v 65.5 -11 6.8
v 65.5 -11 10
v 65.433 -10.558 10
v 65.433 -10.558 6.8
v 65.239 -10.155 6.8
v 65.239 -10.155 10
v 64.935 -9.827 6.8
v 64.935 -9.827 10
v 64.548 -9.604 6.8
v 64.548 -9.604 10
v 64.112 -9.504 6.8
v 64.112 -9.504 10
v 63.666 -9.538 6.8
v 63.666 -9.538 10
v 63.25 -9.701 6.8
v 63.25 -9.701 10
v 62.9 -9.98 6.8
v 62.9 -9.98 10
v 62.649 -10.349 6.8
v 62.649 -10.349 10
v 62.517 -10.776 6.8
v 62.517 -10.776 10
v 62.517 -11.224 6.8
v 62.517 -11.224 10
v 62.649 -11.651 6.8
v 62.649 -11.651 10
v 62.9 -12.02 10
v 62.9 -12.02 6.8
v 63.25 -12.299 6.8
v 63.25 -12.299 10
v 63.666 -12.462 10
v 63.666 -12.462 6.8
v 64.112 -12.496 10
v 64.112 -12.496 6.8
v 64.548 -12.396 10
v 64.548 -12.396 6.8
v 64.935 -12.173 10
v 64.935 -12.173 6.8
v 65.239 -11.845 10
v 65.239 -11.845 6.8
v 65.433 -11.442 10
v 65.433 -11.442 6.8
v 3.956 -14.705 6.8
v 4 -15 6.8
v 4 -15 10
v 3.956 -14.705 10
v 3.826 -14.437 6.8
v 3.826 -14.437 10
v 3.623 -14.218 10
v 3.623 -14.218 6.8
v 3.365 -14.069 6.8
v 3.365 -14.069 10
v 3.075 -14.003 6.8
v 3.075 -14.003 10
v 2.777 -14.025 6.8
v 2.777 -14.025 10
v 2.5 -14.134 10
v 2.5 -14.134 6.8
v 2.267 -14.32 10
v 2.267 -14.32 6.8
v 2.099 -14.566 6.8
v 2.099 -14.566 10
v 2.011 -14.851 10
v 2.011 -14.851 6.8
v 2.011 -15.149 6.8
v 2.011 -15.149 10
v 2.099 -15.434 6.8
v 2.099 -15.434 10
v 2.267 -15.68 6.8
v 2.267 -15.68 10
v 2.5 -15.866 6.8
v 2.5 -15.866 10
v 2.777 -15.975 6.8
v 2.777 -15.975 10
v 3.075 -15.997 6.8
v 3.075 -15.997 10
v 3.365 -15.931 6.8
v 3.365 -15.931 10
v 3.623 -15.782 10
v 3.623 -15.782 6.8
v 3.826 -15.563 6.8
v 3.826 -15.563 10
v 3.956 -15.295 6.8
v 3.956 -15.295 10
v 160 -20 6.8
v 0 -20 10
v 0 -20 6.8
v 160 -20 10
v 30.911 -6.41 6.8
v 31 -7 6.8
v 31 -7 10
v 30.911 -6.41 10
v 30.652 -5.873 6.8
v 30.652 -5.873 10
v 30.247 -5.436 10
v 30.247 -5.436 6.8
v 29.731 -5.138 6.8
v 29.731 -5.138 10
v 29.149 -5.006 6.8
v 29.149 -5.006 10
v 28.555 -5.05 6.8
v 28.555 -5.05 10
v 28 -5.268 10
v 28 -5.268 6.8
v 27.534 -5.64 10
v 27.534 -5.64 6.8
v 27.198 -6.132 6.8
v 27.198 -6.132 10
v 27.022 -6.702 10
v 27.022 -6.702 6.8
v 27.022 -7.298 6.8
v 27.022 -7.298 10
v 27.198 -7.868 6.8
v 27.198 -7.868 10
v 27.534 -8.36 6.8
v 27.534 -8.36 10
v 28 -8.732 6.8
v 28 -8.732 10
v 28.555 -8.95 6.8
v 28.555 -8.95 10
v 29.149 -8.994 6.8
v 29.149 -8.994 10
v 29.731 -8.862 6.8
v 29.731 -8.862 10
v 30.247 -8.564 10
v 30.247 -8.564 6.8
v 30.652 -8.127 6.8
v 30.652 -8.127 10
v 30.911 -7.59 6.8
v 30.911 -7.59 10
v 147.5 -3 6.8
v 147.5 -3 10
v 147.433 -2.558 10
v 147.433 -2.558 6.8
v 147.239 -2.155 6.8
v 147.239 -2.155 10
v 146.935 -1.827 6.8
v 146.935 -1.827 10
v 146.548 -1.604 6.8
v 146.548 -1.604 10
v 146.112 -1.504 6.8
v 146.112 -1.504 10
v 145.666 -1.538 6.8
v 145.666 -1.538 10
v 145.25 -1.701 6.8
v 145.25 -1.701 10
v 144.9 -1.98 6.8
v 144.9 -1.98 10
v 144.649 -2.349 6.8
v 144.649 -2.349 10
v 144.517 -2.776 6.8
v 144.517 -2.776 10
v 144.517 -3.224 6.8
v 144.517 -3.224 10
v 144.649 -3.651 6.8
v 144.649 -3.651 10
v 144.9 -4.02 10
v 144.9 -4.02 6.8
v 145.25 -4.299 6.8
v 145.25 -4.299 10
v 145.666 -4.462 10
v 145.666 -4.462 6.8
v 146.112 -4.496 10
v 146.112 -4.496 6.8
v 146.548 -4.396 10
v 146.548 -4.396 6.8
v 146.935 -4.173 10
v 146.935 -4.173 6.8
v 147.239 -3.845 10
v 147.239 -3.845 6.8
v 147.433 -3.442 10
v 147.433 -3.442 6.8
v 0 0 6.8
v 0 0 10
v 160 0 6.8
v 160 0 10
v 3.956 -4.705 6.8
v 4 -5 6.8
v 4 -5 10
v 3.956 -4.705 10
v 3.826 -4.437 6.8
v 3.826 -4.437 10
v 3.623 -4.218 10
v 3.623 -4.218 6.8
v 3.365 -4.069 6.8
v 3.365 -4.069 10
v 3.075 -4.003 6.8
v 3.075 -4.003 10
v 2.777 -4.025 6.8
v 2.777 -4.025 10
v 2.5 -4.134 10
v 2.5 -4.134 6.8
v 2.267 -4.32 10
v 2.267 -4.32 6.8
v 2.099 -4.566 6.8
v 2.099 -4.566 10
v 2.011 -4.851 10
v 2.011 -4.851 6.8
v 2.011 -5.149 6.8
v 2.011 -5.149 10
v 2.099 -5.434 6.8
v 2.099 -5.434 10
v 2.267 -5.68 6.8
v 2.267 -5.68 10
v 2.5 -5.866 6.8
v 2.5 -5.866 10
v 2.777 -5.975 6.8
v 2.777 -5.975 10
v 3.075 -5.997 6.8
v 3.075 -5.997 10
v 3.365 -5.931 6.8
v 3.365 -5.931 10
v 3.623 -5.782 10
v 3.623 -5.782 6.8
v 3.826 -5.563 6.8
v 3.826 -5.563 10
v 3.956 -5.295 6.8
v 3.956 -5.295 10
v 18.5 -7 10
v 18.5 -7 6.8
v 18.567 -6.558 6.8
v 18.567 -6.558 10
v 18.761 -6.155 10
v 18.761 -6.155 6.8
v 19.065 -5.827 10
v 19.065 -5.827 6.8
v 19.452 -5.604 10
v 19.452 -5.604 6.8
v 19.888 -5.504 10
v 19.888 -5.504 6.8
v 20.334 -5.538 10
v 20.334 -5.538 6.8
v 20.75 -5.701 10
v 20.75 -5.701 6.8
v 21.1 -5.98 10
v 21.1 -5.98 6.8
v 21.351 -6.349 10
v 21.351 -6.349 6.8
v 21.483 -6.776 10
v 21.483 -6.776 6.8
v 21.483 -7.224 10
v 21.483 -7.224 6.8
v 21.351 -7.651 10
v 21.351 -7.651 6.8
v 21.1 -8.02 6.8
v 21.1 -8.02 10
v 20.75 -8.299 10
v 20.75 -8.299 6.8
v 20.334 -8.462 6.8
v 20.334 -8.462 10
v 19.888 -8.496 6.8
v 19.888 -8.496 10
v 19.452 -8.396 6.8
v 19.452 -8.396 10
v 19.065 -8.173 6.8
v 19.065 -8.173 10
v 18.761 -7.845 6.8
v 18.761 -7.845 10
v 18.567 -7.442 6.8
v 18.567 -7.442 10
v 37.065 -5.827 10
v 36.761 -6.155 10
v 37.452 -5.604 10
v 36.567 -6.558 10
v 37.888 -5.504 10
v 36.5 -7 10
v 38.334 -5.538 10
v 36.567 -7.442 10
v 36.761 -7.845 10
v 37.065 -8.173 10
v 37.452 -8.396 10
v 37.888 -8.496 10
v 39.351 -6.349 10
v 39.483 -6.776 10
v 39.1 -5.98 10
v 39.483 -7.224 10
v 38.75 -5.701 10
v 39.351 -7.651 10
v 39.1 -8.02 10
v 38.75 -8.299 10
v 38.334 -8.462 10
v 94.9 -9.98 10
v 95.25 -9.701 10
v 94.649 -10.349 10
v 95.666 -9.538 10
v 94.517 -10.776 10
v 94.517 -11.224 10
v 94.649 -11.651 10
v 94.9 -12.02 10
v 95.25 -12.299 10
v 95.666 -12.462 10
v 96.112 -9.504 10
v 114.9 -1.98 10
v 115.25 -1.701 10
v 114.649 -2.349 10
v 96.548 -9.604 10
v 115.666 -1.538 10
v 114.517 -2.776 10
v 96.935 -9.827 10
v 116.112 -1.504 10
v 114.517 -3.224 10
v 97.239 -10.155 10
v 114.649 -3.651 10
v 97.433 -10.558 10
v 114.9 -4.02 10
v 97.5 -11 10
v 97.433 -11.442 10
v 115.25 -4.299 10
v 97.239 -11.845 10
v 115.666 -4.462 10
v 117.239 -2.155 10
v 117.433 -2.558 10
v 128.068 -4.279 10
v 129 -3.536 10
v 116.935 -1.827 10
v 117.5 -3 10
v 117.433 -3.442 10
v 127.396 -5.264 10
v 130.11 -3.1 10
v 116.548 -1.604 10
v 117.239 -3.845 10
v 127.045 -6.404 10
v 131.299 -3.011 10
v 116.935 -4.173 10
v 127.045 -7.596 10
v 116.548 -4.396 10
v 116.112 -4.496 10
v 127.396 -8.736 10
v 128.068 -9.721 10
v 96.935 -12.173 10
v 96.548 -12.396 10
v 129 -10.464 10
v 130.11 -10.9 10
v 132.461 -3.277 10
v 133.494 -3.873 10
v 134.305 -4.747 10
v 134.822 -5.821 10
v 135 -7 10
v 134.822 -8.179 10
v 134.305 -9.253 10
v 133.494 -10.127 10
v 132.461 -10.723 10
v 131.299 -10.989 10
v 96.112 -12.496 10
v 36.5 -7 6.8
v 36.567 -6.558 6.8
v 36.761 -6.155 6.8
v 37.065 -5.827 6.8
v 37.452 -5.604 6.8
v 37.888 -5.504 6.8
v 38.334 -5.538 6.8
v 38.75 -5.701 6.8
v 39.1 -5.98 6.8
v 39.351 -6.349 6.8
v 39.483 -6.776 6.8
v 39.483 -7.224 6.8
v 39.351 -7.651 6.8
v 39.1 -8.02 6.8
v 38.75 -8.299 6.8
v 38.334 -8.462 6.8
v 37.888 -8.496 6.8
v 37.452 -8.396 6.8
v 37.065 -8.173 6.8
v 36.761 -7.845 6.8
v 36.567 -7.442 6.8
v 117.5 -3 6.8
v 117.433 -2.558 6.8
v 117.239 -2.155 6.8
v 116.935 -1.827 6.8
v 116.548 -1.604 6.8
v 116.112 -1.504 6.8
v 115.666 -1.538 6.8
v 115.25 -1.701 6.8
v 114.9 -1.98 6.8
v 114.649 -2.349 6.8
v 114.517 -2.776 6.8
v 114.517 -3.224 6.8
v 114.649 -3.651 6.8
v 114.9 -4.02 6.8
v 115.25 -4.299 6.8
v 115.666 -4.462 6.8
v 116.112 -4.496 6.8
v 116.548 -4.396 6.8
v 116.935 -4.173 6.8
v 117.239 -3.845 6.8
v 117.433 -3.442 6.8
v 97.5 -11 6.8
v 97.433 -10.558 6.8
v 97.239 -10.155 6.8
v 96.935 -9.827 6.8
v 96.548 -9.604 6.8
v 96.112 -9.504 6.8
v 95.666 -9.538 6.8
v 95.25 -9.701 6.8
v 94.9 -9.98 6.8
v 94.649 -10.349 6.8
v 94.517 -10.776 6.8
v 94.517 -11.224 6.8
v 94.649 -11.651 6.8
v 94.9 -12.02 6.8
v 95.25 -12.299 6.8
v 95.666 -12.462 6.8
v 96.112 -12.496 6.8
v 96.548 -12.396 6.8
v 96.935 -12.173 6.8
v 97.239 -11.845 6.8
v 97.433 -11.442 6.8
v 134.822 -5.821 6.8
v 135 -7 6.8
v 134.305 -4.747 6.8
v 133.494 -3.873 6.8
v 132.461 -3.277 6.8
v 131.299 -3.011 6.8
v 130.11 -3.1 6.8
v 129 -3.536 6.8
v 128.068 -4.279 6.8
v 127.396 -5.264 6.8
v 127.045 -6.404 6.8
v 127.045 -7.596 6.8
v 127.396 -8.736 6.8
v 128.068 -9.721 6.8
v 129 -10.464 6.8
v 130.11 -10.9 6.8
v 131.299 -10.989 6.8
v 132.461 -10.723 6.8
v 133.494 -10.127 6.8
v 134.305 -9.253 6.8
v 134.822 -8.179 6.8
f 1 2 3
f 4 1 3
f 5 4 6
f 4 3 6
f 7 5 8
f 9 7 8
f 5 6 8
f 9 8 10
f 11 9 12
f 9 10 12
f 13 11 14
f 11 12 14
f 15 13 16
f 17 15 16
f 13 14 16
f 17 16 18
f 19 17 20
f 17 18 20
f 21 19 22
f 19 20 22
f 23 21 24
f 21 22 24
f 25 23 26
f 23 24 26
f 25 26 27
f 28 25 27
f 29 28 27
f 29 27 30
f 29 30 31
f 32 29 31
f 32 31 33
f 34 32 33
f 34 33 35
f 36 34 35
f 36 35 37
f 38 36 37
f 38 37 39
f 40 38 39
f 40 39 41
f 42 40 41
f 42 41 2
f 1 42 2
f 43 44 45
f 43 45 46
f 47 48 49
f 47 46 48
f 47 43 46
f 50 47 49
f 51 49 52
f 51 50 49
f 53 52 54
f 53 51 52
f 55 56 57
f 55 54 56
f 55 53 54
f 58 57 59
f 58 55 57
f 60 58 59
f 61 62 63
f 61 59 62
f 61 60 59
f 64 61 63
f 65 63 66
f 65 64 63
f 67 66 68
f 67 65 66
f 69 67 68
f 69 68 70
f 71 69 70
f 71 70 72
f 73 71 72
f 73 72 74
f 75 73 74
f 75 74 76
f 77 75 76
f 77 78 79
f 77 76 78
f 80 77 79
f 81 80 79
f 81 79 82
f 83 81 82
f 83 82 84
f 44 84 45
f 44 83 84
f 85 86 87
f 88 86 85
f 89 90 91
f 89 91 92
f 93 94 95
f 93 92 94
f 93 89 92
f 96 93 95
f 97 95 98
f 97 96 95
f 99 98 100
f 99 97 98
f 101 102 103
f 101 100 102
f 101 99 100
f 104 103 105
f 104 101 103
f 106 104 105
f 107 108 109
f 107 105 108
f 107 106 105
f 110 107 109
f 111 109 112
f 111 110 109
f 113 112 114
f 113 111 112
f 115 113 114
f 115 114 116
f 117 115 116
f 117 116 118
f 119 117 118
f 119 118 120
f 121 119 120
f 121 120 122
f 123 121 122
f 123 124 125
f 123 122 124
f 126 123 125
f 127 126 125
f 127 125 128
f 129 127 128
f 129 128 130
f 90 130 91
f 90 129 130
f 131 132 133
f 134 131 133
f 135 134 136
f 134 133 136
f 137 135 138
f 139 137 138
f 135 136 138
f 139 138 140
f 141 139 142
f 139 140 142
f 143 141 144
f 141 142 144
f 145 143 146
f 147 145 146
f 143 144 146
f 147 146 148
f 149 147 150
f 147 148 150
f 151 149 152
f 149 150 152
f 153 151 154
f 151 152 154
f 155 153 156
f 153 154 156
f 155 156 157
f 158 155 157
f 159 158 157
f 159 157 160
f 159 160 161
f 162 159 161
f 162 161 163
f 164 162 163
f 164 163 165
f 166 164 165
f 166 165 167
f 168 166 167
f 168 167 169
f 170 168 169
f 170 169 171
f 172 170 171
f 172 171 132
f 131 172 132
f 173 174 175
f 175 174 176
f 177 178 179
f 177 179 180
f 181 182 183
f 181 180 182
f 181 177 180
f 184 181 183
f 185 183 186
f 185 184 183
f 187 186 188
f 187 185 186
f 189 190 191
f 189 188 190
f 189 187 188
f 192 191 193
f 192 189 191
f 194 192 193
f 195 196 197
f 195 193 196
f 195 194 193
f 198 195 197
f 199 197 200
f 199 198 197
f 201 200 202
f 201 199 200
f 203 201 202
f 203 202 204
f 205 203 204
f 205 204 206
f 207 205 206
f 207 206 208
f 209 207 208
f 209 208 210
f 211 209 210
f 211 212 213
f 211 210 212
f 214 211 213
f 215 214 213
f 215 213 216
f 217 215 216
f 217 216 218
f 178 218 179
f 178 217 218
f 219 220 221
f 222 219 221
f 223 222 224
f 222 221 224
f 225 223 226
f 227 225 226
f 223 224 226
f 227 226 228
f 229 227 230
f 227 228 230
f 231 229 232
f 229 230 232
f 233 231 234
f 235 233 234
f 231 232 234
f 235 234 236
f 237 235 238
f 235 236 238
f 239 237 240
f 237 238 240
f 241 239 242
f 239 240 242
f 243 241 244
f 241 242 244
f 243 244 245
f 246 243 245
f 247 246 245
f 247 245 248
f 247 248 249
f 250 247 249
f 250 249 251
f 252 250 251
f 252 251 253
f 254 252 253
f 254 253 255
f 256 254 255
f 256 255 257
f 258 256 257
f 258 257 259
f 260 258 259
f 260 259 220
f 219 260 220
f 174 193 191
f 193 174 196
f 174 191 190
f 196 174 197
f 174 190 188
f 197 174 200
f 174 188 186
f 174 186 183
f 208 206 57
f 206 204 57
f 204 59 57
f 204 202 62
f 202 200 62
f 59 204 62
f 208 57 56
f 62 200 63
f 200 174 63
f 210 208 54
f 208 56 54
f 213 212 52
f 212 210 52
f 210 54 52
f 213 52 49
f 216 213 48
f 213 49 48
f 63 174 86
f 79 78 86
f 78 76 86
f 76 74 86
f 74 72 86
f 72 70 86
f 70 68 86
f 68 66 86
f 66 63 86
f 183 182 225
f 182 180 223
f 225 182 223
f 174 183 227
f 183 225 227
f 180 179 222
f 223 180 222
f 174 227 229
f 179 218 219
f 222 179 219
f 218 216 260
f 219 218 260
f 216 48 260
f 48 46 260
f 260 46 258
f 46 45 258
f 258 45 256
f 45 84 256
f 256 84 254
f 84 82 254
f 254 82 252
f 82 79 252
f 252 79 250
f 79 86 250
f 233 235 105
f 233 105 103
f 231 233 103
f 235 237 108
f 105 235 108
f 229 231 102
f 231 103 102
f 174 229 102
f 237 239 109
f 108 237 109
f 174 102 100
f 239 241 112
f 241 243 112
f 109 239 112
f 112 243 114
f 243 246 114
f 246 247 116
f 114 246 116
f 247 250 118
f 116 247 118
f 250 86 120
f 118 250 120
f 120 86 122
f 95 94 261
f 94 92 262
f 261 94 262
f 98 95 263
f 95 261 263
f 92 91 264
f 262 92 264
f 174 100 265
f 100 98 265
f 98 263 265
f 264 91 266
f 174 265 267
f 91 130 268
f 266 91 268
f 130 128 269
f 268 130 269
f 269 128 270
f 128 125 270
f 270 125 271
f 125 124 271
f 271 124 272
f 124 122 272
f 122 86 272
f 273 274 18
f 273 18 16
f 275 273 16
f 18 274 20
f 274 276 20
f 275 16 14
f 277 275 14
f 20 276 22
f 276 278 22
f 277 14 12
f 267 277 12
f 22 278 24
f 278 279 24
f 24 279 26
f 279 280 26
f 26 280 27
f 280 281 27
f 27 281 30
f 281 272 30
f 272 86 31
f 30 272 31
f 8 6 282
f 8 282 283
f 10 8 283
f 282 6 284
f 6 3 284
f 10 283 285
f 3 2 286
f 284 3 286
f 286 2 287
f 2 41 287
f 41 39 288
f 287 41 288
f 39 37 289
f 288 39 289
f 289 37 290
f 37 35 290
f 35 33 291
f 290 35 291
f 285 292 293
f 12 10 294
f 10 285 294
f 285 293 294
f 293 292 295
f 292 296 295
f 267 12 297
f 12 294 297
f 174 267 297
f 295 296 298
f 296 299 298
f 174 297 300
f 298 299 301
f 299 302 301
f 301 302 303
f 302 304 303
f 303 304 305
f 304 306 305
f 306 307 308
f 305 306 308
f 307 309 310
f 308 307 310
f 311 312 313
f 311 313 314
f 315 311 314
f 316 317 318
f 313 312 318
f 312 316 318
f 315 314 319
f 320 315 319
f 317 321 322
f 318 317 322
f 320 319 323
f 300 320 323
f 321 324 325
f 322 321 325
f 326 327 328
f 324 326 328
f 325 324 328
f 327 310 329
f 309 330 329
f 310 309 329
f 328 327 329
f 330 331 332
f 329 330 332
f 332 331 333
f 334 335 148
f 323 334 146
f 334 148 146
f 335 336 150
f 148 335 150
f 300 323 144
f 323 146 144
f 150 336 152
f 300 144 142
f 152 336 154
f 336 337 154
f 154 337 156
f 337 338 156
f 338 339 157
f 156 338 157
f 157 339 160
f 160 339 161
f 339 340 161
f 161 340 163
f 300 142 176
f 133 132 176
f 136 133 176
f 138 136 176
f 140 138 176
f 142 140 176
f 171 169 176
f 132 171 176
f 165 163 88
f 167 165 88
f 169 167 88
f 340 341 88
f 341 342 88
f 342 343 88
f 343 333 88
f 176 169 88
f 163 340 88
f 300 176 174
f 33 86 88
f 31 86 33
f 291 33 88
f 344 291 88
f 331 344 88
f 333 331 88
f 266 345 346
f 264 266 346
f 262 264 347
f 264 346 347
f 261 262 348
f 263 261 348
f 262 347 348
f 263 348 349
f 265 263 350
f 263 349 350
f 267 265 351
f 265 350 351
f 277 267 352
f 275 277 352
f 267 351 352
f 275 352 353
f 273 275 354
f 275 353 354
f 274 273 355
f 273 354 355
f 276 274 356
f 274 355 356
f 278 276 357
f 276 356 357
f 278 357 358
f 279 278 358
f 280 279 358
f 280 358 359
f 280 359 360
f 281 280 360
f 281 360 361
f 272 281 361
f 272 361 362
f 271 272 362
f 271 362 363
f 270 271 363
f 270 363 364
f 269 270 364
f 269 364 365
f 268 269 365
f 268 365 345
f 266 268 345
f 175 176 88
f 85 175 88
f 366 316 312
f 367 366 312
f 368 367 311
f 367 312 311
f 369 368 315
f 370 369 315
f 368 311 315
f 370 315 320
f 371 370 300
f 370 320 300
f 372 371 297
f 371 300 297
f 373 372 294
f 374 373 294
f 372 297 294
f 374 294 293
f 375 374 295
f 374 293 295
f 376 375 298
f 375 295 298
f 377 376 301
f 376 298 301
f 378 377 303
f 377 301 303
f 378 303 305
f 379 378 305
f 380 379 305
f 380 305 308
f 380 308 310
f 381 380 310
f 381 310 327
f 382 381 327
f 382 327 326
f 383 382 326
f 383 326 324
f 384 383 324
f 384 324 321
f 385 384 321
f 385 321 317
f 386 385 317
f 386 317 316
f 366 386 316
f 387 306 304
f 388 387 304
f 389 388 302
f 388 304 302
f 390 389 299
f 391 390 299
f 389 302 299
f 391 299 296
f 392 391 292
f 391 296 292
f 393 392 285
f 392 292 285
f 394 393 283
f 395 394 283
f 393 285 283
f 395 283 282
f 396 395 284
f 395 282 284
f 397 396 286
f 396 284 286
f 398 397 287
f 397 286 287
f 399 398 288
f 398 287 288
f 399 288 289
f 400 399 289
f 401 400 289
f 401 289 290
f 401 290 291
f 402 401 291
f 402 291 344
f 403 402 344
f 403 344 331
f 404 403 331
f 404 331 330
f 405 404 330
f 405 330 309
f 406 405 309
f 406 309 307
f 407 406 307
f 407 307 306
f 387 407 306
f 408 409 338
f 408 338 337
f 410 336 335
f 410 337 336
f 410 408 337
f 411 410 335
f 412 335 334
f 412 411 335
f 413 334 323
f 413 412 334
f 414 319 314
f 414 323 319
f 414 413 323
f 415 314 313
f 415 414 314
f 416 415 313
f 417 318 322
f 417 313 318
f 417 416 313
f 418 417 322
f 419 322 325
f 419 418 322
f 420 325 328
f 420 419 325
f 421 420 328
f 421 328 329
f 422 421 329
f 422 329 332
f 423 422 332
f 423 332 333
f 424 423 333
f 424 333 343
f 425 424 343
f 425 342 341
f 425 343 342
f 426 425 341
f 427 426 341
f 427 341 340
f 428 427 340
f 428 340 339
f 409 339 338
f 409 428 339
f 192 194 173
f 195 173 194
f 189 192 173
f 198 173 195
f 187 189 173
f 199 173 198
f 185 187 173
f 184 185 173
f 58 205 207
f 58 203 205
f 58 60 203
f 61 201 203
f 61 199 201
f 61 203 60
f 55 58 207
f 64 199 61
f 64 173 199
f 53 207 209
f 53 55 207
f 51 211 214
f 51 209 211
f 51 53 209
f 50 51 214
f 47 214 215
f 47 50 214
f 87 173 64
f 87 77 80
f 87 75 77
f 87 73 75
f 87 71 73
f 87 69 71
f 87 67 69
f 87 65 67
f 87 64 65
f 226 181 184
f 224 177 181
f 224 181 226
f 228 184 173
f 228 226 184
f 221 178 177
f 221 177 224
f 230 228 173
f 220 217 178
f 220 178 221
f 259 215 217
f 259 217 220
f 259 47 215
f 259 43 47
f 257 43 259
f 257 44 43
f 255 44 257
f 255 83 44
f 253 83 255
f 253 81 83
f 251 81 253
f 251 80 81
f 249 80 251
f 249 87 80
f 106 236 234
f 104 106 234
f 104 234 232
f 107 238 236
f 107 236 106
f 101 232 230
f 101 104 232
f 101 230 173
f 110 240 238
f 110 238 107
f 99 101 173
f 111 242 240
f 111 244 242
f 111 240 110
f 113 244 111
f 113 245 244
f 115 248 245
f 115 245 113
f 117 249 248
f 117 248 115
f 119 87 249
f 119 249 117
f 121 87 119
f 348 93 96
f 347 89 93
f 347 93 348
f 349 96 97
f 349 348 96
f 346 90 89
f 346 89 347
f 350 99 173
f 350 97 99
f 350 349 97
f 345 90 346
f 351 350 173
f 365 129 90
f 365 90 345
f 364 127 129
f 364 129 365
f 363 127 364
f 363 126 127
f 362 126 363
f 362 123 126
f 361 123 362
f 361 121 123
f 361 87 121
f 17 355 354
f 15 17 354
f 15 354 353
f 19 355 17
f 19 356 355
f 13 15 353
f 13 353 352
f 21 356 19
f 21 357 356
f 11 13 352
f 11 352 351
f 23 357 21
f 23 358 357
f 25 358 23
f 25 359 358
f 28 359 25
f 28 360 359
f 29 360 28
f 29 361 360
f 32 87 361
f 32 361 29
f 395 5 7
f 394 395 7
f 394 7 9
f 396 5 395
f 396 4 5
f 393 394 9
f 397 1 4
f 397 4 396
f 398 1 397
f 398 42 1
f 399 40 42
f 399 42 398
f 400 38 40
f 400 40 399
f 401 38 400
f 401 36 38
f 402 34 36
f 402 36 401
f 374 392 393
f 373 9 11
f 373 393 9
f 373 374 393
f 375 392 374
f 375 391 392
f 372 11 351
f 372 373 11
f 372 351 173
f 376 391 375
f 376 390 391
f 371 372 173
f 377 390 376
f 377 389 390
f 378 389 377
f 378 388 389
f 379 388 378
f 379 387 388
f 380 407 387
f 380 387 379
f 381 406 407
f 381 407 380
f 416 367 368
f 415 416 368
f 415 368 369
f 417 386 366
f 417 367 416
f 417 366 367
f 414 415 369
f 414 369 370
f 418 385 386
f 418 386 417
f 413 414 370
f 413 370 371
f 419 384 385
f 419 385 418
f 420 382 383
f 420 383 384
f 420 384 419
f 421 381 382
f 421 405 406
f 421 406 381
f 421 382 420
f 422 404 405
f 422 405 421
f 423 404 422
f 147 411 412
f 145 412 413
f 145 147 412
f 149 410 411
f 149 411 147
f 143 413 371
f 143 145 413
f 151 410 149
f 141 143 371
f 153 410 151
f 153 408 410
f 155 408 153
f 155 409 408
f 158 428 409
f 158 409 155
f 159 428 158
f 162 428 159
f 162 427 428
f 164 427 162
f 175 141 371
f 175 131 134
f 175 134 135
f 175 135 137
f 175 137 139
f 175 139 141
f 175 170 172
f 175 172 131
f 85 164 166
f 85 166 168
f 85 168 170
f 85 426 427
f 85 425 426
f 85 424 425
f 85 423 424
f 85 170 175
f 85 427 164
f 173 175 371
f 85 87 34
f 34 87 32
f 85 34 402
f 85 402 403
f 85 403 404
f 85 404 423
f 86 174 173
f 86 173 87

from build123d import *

# Parameters (mm, degrees)
SKETCH2_W               = 160
SKETCH2_H               = 20
BOSS_EXTRUDE1_DEPTH     = 3.2
CUT_EXTRUDE1_DEPTH      = 162.276904732
CUT_EXTRUDE1_DEPTH_BACK = 162.276904732
SKETCH5_R               = 4
SKETCH5_R_2             = 2
SKETCH6_R               = 1.5
CUT_EXTRUDE2_DEPTH      = 10
CUT_EXTRUDE3_DEPTH      = 162.276904732
CUT_EXTRUDE3_DEPTH_BACK = 162.276904732
SKETCH7_R               = 1
SKETCH8_R               = 1.5
CUT_EXTRUDE4_DEPTH      = 10
SKETCH9_R               = 1.5
CUT_EXTRUDE5_DEPTH      = 10


with BuildPart() as part:
    # Sketch2 → Boss-Extrude1 (new body)
    with BuildSketch(Plane(origin=(0, -10, 10), x_dir=(1, 0, 0), z_dir=(0, 0, -1))):
        with Locations((80, 0)):
            Rectangle(SKETCH2_W, SKETCH2_H)
    extrude(amount=BOSS_EXTRUDE1_DEPTH)

    # Sketch5 → Cut-Extrude1 (cut, two sides: drawn at the far end of the back side and taken through both)
    with BuildSketch(Plane.XY.offset(10).offset(-CUT_EXTRUDE1_DEPTH_BACK)):
        with Locations((131, -7)):
            Circle(SKETCH5_R)
        with Locations((29, -7)):
            Circle(SKETCH5_R_2)
    extrude(amount=CUT_EXTRUDE1_DEPTH + CUT_EXTRUDE1_DEPTH_BACK, mode=Mode.SUBTRACT)

    # Sketch6 → Cut-Extrude2 (cut)
    with BuildSketch(Plane.XY.offset(10)):
        with Locations((96, -11)):
            Circle(SKETCH6_R)
        with Locations((64, -11)):
            Circle(SKETCH6_R)
    extrude(amount=-CUT_EXTRUDE2_DEPTH, mode=Mode.SUBTRACT)

    # Sketch7 → Cut-Extrude3 (cut, two sides: drawn at the far end of the back side and taken through both)
    with BuildSketch(Plane.XY.offset(10).offset(-CUT_EXTRUDE3_DEPTH_BACK)):
        with Locations((3, -15)):
            Circle(SKETCH7_R)
        with Locations((3, -5)):
            Circle(SKETCH7_R)
    extrude(amount=CUT_EXTRUDE3_DEPTH + CUT_EXTRUDE3_DEPTH_BACK, mode=Mode.SUBTRACT)

    # Sketch8 → Cut-Extrude4 (cut)
    with BuildSketch(Plane.XY.offset(10)):
        with Locations((146, -3)):
            Circle(SKETCH8_R)
        with Locations((116, -3)):
            Circle(SKETCH8_R)
    extrude(amount=-CUT_EXTRUDE4_DEPTH, mode=Mode.SUBTRACT)

    # Sketch9 → Cut-Extrude5 (cut)
    with BuildSketch(Plane(origin=(0, 0, 6.8), x_dir=(-1, 0, 0), z_dir=(0, 0, -1))):
        with Locations((-20, -7)):
            Circle(SKETCH9_R)
        with Locations((-38, -7)):
            Circle(SKETCH9_R)
    extrude(amount=-CUT_EXTRUDE5_DEPTH, mode=Mode.SUBTRACT)


solid = part.part
